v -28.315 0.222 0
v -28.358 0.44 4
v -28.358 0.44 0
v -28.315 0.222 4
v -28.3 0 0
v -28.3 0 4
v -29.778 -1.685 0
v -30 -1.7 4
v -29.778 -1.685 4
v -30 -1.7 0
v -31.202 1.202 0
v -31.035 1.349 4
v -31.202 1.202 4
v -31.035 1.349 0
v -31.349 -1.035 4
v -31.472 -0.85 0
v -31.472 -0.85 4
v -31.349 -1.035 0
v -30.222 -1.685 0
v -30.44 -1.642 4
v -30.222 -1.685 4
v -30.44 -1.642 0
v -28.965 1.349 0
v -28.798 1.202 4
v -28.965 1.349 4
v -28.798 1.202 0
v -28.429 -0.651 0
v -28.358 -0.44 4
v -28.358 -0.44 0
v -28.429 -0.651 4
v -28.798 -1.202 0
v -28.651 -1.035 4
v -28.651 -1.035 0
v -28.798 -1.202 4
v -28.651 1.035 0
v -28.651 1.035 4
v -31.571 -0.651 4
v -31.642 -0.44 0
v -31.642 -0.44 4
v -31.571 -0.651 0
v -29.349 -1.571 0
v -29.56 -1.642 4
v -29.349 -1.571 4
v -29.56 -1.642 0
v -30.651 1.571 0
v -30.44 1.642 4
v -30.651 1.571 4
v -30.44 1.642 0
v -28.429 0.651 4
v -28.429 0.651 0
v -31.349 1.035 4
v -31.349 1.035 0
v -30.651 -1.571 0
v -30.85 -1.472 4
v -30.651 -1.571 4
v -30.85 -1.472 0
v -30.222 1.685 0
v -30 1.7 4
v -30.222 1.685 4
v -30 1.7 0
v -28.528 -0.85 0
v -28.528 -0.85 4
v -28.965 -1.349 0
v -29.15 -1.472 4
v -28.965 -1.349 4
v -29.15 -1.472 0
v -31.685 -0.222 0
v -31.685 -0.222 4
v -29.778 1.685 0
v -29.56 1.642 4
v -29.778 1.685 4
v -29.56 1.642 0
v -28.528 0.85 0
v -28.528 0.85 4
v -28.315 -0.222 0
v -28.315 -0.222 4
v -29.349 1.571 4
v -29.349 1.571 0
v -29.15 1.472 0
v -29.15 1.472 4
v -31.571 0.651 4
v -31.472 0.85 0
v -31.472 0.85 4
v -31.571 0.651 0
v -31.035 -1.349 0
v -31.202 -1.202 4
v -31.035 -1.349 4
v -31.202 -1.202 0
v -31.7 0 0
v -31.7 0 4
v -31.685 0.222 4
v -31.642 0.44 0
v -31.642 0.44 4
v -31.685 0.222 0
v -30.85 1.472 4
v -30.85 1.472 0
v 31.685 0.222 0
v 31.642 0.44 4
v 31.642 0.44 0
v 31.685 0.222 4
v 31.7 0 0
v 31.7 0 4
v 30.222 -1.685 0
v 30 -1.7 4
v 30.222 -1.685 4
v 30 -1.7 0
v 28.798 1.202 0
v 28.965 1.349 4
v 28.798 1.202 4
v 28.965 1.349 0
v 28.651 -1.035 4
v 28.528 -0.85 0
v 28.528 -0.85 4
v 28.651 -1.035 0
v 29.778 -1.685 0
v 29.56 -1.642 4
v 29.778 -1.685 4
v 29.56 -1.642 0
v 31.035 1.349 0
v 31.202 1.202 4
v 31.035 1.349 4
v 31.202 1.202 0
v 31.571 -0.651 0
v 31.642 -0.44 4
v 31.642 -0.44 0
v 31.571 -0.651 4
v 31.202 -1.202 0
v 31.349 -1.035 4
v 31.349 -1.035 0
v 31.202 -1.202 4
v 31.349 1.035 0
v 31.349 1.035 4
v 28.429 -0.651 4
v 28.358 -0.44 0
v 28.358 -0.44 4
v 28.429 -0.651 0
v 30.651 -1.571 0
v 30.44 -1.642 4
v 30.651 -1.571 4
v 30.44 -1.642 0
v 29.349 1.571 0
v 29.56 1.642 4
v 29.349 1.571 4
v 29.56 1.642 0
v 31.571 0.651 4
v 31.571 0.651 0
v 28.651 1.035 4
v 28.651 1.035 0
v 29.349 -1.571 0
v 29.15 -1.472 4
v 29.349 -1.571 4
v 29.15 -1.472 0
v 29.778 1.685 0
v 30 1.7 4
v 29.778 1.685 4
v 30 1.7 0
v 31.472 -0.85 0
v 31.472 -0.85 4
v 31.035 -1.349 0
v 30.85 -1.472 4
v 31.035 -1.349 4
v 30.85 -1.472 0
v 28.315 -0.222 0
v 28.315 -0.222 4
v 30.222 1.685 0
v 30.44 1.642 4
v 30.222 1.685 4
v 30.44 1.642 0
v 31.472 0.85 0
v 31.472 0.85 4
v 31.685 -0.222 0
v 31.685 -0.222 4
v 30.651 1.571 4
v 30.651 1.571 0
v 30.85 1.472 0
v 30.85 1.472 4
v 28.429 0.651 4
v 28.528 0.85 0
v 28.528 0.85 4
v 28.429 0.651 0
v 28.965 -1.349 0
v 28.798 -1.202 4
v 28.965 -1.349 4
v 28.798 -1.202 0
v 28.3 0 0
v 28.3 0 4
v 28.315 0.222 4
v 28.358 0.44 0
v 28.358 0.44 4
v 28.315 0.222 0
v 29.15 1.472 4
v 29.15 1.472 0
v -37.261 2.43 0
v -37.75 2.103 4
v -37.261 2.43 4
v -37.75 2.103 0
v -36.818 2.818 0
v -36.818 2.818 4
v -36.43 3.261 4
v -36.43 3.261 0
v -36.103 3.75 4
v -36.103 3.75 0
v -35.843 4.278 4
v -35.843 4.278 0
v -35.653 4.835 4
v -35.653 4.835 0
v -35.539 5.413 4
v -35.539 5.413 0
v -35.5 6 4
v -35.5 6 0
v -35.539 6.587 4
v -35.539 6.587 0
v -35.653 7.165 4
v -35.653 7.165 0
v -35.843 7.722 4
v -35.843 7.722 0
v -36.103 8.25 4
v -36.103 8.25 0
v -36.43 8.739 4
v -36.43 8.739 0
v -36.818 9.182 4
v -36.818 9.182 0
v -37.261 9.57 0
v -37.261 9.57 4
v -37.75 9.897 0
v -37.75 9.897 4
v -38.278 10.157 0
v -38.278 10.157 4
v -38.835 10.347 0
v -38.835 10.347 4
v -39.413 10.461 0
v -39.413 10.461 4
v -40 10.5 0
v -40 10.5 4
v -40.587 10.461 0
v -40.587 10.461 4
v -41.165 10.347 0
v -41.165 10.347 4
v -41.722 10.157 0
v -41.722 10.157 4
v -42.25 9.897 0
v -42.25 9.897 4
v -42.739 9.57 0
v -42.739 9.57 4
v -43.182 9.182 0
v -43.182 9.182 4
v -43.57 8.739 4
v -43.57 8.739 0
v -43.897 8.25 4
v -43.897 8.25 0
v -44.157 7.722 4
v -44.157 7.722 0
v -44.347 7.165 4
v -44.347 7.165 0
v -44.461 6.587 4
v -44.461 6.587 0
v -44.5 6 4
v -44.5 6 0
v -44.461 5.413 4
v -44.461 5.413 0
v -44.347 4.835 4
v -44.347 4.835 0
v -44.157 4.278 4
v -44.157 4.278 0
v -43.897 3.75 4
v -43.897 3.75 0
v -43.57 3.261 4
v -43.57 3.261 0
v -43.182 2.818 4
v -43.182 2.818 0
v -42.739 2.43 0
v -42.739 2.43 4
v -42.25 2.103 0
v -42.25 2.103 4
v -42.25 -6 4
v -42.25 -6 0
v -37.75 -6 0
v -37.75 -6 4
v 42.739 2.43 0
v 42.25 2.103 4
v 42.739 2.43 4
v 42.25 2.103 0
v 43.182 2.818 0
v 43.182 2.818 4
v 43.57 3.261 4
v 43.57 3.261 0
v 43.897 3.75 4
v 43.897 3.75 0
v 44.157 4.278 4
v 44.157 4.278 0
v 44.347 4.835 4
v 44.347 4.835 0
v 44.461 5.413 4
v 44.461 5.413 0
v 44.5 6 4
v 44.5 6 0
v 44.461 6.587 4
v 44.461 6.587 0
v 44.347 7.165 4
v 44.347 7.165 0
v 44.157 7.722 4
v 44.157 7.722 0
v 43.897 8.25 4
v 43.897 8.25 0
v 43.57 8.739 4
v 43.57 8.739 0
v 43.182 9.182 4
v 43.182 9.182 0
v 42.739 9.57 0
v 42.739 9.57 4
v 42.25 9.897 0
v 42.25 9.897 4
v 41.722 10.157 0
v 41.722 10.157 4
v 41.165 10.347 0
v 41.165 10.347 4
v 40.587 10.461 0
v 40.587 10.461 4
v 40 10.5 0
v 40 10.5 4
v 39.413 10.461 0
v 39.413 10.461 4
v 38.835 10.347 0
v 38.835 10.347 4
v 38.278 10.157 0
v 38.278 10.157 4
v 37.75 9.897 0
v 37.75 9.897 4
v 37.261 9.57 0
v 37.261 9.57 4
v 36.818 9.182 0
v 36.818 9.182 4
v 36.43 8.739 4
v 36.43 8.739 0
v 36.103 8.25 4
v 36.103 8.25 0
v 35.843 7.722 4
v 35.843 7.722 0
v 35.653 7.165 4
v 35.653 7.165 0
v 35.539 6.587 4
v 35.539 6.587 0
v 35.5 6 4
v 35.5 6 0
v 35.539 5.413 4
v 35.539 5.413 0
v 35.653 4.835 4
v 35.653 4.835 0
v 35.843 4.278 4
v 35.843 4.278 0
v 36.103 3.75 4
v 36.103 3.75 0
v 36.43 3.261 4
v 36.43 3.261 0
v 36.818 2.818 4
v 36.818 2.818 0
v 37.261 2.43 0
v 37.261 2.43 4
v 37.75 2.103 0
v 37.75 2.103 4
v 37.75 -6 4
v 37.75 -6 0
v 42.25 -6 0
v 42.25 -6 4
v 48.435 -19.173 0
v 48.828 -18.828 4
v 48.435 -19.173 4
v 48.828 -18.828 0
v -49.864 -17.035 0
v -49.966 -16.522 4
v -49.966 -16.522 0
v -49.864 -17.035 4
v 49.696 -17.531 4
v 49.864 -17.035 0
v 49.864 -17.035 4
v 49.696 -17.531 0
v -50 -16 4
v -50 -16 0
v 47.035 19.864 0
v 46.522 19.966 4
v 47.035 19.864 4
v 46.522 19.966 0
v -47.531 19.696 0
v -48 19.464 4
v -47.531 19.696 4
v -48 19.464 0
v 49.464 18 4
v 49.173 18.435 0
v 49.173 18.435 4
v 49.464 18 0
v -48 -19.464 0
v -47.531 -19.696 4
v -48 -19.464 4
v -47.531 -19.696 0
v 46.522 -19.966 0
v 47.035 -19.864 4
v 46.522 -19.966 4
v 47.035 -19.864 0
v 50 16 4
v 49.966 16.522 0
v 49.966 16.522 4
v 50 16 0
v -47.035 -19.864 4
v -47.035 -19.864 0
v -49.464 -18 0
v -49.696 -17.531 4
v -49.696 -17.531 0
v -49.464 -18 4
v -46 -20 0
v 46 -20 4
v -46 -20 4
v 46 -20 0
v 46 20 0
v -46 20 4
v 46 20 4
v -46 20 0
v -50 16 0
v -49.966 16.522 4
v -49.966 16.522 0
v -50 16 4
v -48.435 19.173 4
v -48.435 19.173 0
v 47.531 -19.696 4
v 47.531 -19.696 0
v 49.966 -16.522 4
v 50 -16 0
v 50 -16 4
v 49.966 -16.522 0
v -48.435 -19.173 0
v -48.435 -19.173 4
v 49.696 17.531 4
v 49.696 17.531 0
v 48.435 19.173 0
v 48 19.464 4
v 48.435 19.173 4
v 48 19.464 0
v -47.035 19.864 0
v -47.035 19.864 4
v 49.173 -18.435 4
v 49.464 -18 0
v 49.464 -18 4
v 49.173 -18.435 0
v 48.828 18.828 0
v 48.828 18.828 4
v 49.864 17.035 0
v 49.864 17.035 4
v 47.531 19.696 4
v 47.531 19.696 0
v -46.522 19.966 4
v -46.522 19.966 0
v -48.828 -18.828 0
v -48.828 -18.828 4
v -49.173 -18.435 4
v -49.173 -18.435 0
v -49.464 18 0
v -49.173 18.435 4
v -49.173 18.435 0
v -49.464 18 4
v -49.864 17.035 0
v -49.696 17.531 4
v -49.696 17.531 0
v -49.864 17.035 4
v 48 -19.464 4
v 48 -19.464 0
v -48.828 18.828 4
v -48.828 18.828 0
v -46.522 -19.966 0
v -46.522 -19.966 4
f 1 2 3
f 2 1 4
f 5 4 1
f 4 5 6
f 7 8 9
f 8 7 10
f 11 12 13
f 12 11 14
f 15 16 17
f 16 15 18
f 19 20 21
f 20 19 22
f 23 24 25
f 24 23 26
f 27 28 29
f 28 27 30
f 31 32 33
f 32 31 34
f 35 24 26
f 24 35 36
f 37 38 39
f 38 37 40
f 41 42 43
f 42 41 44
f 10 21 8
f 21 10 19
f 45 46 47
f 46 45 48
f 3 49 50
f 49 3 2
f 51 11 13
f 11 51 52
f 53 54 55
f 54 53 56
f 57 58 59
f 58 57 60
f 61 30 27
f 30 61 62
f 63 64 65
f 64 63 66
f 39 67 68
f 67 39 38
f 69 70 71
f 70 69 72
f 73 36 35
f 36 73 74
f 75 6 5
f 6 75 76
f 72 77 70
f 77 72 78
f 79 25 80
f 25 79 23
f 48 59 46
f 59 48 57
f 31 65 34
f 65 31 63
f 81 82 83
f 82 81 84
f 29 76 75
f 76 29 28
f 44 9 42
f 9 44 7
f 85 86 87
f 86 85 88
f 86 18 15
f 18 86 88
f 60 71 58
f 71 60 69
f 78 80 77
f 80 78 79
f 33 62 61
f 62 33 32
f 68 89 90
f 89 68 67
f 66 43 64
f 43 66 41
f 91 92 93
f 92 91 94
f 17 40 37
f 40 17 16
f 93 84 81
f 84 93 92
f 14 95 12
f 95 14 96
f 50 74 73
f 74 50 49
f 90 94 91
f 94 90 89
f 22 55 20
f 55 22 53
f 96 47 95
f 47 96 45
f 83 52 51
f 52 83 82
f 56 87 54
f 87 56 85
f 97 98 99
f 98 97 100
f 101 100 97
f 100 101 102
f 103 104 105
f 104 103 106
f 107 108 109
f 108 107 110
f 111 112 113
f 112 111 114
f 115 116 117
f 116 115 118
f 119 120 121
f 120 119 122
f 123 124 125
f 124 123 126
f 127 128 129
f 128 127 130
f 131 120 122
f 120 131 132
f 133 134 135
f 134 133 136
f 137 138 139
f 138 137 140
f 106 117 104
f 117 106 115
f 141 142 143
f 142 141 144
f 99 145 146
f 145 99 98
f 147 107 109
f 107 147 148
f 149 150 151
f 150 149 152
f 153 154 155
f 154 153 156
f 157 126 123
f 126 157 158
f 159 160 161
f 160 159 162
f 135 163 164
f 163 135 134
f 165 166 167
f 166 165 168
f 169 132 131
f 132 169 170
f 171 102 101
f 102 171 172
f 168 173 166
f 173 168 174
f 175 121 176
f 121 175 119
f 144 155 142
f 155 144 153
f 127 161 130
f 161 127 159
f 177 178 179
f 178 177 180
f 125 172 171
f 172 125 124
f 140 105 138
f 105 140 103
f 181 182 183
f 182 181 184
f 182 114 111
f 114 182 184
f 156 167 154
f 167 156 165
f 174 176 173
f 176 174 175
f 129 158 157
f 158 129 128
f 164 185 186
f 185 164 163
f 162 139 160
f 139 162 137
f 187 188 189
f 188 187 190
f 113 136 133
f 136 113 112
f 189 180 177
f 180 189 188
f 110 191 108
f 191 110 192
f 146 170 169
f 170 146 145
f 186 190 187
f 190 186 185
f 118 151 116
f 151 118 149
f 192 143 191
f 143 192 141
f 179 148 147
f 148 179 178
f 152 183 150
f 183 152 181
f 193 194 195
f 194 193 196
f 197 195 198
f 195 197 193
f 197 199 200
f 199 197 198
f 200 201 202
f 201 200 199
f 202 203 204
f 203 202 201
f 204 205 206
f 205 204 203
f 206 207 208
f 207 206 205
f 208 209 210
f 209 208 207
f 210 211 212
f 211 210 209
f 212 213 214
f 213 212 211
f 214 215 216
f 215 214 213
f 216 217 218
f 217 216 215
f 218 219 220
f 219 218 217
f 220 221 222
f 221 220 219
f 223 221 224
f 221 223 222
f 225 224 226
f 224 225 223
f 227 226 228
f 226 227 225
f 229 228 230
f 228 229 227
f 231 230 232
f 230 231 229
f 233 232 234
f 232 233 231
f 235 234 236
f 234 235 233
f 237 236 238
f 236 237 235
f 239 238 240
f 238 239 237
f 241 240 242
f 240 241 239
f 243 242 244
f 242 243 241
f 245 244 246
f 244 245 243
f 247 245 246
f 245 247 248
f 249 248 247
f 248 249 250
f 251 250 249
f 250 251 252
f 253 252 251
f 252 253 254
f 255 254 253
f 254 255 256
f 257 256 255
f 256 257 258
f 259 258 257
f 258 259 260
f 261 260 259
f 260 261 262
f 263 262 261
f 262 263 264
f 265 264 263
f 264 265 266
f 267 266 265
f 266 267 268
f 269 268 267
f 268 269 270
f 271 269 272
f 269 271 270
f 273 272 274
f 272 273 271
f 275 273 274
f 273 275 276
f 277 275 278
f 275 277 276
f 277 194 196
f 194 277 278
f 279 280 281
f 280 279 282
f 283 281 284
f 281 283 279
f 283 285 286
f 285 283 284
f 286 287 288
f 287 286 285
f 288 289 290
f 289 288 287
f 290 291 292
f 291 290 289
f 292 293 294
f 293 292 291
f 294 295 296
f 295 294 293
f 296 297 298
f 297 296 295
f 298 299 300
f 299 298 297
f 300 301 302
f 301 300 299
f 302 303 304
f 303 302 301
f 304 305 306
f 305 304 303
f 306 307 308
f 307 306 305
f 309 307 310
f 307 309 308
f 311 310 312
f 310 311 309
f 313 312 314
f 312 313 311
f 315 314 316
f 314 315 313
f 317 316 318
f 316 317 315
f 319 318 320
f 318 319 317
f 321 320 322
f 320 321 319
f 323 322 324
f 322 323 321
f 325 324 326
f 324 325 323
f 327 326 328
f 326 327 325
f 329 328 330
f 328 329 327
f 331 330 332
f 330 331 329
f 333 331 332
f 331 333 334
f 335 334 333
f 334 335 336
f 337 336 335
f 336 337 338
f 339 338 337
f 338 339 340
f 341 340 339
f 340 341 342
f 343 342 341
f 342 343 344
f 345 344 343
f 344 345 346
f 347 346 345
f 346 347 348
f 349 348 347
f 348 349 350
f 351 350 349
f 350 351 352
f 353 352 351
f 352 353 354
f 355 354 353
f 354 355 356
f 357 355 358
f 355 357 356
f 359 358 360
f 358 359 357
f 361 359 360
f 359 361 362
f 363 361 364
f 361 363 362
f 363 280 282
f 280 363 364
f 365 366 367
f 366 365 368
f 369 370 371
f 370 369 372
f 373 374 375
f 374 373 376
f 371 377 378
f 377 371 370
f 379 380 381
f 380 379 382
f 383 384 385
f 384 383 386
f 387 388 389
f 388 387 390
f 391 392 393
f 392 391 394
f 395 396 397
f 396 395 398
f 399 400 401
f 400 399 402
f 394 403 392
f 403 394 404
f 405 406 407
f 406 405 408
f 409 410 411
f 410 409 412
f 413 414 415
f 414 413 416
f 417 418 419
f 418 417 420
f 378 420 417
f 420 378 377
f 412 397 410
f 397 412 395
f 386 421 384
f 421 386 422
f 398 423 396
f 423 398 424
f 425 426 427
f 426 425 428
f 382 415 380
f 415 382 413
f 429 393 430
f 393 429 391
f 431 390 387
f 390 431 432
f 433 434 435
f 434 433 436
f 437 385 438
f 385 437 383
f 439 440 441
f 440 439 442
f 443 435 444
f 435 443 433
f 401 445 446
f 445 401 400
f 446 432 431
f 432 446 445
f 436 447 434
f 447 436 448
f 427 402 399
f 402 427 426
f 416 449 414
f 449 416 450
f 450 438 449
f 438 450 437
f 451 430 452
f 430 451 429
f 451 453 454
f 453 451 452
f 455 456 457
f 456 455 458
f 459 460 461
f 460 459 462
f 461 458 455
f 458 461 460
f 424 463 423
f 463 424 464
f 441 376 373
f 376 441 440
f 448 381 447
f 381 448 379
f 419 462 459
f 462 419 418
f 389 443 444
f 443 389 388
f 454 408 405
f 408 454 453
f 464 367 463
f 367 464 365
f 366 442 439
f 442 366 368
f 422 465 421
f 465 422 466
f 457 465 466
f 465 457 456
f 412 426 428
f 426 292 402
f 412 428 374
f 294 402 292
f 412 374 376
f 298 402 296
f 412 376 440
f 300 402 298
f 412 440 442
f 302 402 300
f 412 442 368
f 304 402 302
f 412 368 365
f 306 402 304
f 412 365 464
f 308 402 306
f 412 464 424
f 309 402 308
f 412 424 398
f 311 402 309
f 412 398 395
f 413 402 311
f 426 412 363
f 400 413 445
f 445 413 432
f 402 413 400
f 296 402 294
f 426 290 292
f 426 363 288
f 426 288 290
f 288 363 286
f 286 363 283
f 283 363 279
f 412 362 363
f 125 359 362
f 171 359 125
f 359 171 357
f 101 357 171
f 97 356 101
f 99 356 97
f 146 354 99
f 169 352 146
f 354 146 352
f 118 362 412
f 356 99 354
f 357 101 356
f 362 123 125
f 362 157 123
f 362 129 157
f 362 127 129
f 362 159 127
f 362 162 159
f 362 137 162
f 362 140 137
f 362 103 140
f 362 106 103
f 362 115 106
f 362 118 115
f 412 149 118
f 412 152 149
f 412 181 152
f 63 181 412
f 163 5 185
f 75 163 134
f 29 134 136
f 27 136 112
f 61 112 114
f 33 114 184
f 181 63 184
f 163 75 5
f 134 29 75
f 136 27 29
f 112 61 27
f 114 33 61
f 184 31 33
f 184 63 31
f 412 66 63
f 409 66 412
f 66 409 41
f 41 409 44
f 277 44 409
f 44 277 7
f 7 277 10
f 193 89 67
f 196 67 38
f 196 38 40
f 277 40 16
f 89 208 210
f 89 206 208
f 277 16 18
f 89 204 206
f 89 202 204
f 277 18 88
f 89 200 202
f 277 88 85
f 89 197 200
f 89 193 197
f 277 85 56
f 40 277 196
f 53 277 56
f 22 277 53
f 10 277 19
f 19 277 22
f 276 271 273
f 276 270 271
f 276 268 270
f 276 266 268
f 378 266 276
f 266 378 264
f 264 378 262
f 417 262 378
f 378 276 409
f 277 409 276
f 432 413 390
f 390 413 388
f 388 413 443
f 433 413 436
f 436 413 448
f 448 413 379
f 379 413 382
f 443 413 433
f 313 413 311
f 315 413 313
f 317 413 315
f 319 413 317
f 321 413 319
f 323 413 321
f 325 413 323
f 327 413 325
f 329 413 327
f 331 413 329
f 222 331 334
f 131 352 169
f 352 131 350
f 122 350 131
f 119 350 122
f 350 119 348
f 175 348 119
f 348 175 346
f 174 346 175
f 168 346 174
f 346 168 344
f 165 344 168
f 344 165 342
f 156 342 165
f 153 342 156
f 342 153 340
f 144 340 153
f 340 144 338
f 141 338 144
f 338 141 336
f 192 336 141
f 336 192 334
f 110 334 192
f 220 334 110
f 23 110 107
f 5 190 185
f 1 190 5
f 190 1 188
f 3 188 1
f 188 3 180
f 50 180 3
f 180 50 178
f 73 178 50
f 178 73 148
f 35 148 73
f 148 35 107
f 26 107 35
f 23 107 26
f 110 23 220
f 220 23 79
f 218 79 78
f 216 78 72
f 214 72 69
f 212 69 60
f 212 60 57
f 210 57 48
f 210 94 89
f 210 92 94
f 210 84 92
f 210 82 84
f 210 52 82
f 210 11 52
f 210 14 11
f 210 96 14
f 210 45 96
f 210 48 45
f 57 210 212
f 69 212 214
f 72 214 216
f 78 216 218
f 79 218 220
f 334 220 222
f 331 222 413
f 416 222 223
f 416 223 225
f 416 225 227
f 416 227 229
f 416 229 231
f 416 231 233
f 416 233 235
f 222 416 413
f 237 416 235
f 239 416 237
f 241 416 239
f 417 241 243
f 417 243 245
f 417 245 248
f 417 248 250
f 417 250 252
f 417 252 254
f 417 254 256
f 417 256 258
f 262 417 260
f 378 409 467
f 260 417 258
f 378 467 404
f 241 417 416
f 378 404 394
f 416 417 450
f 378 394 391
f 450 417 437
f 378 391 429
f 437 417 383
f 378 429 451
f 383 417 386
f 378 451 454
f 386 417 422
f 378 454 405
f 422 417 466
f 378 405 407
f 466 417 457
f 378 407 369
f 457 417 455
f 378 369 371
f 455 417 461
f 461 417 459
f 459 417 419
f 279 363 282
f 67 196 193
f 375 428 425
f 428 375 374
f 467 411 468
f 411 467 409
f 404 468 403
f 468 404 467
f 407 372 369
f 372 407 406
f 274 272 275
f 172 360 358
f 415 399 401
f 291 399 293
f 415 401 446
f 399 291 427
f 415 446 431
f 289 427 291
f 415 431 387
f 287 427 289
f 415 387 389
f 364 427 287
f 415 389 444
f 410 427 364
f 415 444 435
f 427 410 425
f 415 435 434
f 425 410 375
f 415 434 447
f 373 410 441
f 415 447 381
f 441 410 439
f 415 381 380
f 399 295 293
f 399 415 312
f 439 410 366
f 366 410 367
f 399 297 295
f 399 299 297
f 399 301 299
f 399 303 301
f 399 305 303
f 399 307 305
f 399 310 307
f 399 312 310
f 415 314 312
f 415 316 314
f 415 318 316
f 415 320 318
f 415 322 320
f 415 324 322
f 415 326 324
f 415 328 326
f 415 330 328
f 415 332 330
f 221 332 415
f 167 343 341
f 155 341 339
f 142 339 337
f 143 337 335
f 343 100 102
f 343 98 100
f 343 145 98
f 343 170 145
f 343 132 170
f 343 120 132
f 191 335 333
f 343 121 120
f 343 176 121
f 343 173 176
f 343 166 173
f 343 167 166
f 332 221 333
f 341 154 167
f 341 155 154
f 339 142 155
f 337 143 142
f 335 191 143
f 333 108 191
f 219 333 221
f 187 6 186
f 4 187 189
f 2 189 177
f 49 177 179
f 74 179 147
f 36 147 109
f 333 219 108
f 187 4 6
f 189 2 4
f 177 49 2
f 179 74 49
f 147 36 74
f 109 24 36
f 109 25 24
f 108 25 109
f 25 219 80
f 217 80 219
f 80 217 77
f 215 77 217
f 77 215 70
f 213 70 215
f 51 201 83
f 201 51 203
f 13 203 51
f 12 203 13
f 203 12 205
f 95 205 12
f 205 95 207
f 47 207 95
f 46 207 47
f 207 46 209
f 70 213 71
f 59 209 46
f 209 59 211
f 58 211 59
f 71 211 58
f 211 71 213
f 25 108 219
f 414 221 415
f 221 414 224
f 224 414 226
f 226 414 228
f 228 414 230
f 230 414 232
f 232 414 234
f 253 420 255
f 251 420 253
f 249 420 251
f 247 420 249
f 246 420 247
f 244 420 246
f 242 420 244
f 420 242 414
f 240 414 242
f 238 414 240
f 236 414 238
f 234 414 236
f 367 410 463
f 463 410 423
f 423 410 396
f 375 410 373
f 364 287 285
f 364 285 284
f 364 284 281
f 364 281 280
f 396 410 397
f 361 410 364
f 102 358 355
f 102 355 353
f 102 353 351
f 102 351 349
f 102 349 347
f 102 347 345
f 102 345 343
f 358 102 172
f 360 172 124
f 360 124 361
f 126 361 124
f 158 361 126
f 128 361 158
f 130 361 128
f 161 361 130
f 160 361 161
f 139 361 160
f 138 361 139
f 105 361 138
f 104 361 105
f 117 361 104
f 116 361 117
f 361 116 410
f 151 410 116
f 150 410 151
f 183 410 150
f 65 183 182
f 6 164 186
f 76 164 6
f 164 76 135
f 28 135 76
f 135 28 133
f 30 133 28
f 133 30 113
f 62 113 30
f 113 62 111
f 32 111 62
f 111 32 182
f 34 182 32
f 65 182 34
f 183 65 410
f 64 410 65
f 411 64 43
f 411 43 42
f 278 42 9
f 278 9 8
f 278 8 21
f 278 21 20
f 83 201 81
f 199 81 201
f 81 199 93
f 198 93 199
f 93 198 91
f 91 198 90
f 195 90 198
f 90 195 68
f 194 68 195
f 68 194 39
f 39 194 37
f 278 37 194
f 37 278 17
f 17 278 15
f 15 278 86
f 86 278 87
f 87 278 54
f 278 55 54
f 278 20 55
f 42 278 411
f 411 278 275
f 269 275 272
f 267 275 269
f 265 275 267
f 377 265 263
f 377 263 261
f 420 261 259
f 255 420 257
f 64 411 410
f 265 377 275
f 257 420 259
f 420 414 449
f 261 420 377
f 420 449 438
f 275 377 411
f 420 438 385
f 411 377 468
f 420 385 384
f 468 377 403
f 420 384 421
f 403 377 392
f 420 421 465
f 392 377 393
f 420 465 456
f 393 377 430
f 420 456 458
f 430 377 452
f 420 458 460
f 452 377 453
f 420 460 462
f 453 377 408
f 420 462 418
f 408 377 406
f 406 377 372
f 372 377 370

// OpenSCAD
// file: params.scad
// Shared dimensions for the kitchen dashboard case + accessories.
// Measured from the physical board (2026-09-12) unless noted "estimate".

// --- board (DIYmalls/Sunton ESP32-8048S043C) ---
board_l = 123.23;
board_w = 74;
board_pcb_t = 2.5;
board_stack_t = 8.5;       // full depth incl. display glass + tallest connector
screen_active_l = 105.55;
screen_active_w = 67.29;

// Corner mounting hole inset from each board edge — estimated from photos,
// NOT measured directly. Verify against the physical board before printing
// the first standoff test piece.
board_hole_inset = 6;
board_hole_d = 3.2;        // clearance hole for M3
standoff_od = 6;
standoff_pilot_d = 2.5;    // self-tapping pilot for M3 into a printed standoff

// --- case shell ---
wall_t = 2.4;
corner_r = 6;
bezel_margin_lr = 9;       // left/right front-face margin
bezel_margin_bottom = 9;   // bottom front-face margin
bezel_margin_top = 30;     // extra room up top so the PIR bore clears the screen

case_outer_l = board_l + 2 * bezel_margin_lr;                    // 141.23
case_outer_w = board_w + bezel_margin_top + bezel_margin_bottom; // 113

// The board+screen assembly sits off-center in y within the taller case,
// shifted down by half the top/bottom margin difference. Applied to the
// screen cutout AND the board standoffs so they stay aligned to each other.
board_center_y_offset = -(bezel_margin_top - bezel_margin_bottom) / 2; // -10.5

board_zone_depth = board_stack_t + 3;        // clearance behind board face
electronics_bay_depth = 20;                  // MT3608 + AA holder + wiring
case_depth = wall_t + board_zone_depth + electronics_bay_depth + wall_t; // ~37.9

// --- screen cutout (front face) ---
// Slight overlap onto the board's own black bezel hides print-edge
// roughness and print tolerance without covering active pixels.
screen_cutout_l = screen_active_l + 2;
screen_cutout_w = screen_active_w + 2;

// --- PIR bore (front face, centered in the top margin, above the screen) ---
pir_bore_d = 24;          // HC-SR501 dome ~23mm + clearance
pir_bore_y = case_outer_w / 2 - pir_bore_d / 2 - 1; // 1mm clear of the outer edge

// --- battery access hatch (rear face) ---
// Sized for a 3xAA holder (~53 x 16mm typical) plus margin.
hatch_l = 66;
hatch_w = 26;

// --- mount accessory interface (shared by wall_hanger.scad and stand.scad) ---
// Two M3 heat-set insert bosses on the case's exterior back face.
mount_boss_spacing = 60;   // x-distance between the two bosses
mount_boss_y = -15;        // offset from vertical center (negative = toward top)
mount_boss_insert_d = 4.6; // M3 brass heat-set insert OD
mount_boss_od = 9;
mount_screw_clearance_d = 3.4;
// main file
// Wall-hanger accessory: screws to the case's 2 mount bosses (see
// params.scad), hangs on 2 wall screws via keyhole slots.

include <params.scad>

$fn = 48;

plate_l = mount_boss_spacing + 40;
plate_w = 40;
plate_t = 4;

wall_screw_spacing = 80;    // distance between the 2 wall screws you drive
keyhole_head_d = 9;         // clears a standard drywall-anchor screw head
keyhole_shaft_w = 4.5;
keyhole_travel = 12;        // slot length the case can drop down onto

module rounded_rect(l, w, r) {
    hull() {
        for (x = [-1, 1], y = [-1, 1])
            translate([x * (l / 2 - r), y * (w / 2 - r)])
                circle(r = r);
    }
}

module keyhole() {
    translate([0, keyhole_travel / 2])
        circle(d = keyhole_head_d);
    translate([-keyhole_shaft_w / 2, -keyhole_travel / 2])
        square([keyhole_shaft_w, keyhole_travel]);
}

difference() {
    linear_extrude(height = plate_t)
        rounded_rect(plate_l, plate_w, 4);

    // screws into the case's mount bosses
    translate([0, 0, -1])
        for (x = [-1, 1])
            translate([x * mount_boss_spacing / 2, 0, 0])
                cylinder(d = mount_screw_clearance_d, h = plate_t + 2);

    // keyholes for the wall screws
    translate([0, 0, -1])
        for (x = [-1, 1])
            translate([x * wall_screw_spacing / 2, 0, 0])
                linear_extrude(height = plate_t + 2)
                    keyhole();
}
